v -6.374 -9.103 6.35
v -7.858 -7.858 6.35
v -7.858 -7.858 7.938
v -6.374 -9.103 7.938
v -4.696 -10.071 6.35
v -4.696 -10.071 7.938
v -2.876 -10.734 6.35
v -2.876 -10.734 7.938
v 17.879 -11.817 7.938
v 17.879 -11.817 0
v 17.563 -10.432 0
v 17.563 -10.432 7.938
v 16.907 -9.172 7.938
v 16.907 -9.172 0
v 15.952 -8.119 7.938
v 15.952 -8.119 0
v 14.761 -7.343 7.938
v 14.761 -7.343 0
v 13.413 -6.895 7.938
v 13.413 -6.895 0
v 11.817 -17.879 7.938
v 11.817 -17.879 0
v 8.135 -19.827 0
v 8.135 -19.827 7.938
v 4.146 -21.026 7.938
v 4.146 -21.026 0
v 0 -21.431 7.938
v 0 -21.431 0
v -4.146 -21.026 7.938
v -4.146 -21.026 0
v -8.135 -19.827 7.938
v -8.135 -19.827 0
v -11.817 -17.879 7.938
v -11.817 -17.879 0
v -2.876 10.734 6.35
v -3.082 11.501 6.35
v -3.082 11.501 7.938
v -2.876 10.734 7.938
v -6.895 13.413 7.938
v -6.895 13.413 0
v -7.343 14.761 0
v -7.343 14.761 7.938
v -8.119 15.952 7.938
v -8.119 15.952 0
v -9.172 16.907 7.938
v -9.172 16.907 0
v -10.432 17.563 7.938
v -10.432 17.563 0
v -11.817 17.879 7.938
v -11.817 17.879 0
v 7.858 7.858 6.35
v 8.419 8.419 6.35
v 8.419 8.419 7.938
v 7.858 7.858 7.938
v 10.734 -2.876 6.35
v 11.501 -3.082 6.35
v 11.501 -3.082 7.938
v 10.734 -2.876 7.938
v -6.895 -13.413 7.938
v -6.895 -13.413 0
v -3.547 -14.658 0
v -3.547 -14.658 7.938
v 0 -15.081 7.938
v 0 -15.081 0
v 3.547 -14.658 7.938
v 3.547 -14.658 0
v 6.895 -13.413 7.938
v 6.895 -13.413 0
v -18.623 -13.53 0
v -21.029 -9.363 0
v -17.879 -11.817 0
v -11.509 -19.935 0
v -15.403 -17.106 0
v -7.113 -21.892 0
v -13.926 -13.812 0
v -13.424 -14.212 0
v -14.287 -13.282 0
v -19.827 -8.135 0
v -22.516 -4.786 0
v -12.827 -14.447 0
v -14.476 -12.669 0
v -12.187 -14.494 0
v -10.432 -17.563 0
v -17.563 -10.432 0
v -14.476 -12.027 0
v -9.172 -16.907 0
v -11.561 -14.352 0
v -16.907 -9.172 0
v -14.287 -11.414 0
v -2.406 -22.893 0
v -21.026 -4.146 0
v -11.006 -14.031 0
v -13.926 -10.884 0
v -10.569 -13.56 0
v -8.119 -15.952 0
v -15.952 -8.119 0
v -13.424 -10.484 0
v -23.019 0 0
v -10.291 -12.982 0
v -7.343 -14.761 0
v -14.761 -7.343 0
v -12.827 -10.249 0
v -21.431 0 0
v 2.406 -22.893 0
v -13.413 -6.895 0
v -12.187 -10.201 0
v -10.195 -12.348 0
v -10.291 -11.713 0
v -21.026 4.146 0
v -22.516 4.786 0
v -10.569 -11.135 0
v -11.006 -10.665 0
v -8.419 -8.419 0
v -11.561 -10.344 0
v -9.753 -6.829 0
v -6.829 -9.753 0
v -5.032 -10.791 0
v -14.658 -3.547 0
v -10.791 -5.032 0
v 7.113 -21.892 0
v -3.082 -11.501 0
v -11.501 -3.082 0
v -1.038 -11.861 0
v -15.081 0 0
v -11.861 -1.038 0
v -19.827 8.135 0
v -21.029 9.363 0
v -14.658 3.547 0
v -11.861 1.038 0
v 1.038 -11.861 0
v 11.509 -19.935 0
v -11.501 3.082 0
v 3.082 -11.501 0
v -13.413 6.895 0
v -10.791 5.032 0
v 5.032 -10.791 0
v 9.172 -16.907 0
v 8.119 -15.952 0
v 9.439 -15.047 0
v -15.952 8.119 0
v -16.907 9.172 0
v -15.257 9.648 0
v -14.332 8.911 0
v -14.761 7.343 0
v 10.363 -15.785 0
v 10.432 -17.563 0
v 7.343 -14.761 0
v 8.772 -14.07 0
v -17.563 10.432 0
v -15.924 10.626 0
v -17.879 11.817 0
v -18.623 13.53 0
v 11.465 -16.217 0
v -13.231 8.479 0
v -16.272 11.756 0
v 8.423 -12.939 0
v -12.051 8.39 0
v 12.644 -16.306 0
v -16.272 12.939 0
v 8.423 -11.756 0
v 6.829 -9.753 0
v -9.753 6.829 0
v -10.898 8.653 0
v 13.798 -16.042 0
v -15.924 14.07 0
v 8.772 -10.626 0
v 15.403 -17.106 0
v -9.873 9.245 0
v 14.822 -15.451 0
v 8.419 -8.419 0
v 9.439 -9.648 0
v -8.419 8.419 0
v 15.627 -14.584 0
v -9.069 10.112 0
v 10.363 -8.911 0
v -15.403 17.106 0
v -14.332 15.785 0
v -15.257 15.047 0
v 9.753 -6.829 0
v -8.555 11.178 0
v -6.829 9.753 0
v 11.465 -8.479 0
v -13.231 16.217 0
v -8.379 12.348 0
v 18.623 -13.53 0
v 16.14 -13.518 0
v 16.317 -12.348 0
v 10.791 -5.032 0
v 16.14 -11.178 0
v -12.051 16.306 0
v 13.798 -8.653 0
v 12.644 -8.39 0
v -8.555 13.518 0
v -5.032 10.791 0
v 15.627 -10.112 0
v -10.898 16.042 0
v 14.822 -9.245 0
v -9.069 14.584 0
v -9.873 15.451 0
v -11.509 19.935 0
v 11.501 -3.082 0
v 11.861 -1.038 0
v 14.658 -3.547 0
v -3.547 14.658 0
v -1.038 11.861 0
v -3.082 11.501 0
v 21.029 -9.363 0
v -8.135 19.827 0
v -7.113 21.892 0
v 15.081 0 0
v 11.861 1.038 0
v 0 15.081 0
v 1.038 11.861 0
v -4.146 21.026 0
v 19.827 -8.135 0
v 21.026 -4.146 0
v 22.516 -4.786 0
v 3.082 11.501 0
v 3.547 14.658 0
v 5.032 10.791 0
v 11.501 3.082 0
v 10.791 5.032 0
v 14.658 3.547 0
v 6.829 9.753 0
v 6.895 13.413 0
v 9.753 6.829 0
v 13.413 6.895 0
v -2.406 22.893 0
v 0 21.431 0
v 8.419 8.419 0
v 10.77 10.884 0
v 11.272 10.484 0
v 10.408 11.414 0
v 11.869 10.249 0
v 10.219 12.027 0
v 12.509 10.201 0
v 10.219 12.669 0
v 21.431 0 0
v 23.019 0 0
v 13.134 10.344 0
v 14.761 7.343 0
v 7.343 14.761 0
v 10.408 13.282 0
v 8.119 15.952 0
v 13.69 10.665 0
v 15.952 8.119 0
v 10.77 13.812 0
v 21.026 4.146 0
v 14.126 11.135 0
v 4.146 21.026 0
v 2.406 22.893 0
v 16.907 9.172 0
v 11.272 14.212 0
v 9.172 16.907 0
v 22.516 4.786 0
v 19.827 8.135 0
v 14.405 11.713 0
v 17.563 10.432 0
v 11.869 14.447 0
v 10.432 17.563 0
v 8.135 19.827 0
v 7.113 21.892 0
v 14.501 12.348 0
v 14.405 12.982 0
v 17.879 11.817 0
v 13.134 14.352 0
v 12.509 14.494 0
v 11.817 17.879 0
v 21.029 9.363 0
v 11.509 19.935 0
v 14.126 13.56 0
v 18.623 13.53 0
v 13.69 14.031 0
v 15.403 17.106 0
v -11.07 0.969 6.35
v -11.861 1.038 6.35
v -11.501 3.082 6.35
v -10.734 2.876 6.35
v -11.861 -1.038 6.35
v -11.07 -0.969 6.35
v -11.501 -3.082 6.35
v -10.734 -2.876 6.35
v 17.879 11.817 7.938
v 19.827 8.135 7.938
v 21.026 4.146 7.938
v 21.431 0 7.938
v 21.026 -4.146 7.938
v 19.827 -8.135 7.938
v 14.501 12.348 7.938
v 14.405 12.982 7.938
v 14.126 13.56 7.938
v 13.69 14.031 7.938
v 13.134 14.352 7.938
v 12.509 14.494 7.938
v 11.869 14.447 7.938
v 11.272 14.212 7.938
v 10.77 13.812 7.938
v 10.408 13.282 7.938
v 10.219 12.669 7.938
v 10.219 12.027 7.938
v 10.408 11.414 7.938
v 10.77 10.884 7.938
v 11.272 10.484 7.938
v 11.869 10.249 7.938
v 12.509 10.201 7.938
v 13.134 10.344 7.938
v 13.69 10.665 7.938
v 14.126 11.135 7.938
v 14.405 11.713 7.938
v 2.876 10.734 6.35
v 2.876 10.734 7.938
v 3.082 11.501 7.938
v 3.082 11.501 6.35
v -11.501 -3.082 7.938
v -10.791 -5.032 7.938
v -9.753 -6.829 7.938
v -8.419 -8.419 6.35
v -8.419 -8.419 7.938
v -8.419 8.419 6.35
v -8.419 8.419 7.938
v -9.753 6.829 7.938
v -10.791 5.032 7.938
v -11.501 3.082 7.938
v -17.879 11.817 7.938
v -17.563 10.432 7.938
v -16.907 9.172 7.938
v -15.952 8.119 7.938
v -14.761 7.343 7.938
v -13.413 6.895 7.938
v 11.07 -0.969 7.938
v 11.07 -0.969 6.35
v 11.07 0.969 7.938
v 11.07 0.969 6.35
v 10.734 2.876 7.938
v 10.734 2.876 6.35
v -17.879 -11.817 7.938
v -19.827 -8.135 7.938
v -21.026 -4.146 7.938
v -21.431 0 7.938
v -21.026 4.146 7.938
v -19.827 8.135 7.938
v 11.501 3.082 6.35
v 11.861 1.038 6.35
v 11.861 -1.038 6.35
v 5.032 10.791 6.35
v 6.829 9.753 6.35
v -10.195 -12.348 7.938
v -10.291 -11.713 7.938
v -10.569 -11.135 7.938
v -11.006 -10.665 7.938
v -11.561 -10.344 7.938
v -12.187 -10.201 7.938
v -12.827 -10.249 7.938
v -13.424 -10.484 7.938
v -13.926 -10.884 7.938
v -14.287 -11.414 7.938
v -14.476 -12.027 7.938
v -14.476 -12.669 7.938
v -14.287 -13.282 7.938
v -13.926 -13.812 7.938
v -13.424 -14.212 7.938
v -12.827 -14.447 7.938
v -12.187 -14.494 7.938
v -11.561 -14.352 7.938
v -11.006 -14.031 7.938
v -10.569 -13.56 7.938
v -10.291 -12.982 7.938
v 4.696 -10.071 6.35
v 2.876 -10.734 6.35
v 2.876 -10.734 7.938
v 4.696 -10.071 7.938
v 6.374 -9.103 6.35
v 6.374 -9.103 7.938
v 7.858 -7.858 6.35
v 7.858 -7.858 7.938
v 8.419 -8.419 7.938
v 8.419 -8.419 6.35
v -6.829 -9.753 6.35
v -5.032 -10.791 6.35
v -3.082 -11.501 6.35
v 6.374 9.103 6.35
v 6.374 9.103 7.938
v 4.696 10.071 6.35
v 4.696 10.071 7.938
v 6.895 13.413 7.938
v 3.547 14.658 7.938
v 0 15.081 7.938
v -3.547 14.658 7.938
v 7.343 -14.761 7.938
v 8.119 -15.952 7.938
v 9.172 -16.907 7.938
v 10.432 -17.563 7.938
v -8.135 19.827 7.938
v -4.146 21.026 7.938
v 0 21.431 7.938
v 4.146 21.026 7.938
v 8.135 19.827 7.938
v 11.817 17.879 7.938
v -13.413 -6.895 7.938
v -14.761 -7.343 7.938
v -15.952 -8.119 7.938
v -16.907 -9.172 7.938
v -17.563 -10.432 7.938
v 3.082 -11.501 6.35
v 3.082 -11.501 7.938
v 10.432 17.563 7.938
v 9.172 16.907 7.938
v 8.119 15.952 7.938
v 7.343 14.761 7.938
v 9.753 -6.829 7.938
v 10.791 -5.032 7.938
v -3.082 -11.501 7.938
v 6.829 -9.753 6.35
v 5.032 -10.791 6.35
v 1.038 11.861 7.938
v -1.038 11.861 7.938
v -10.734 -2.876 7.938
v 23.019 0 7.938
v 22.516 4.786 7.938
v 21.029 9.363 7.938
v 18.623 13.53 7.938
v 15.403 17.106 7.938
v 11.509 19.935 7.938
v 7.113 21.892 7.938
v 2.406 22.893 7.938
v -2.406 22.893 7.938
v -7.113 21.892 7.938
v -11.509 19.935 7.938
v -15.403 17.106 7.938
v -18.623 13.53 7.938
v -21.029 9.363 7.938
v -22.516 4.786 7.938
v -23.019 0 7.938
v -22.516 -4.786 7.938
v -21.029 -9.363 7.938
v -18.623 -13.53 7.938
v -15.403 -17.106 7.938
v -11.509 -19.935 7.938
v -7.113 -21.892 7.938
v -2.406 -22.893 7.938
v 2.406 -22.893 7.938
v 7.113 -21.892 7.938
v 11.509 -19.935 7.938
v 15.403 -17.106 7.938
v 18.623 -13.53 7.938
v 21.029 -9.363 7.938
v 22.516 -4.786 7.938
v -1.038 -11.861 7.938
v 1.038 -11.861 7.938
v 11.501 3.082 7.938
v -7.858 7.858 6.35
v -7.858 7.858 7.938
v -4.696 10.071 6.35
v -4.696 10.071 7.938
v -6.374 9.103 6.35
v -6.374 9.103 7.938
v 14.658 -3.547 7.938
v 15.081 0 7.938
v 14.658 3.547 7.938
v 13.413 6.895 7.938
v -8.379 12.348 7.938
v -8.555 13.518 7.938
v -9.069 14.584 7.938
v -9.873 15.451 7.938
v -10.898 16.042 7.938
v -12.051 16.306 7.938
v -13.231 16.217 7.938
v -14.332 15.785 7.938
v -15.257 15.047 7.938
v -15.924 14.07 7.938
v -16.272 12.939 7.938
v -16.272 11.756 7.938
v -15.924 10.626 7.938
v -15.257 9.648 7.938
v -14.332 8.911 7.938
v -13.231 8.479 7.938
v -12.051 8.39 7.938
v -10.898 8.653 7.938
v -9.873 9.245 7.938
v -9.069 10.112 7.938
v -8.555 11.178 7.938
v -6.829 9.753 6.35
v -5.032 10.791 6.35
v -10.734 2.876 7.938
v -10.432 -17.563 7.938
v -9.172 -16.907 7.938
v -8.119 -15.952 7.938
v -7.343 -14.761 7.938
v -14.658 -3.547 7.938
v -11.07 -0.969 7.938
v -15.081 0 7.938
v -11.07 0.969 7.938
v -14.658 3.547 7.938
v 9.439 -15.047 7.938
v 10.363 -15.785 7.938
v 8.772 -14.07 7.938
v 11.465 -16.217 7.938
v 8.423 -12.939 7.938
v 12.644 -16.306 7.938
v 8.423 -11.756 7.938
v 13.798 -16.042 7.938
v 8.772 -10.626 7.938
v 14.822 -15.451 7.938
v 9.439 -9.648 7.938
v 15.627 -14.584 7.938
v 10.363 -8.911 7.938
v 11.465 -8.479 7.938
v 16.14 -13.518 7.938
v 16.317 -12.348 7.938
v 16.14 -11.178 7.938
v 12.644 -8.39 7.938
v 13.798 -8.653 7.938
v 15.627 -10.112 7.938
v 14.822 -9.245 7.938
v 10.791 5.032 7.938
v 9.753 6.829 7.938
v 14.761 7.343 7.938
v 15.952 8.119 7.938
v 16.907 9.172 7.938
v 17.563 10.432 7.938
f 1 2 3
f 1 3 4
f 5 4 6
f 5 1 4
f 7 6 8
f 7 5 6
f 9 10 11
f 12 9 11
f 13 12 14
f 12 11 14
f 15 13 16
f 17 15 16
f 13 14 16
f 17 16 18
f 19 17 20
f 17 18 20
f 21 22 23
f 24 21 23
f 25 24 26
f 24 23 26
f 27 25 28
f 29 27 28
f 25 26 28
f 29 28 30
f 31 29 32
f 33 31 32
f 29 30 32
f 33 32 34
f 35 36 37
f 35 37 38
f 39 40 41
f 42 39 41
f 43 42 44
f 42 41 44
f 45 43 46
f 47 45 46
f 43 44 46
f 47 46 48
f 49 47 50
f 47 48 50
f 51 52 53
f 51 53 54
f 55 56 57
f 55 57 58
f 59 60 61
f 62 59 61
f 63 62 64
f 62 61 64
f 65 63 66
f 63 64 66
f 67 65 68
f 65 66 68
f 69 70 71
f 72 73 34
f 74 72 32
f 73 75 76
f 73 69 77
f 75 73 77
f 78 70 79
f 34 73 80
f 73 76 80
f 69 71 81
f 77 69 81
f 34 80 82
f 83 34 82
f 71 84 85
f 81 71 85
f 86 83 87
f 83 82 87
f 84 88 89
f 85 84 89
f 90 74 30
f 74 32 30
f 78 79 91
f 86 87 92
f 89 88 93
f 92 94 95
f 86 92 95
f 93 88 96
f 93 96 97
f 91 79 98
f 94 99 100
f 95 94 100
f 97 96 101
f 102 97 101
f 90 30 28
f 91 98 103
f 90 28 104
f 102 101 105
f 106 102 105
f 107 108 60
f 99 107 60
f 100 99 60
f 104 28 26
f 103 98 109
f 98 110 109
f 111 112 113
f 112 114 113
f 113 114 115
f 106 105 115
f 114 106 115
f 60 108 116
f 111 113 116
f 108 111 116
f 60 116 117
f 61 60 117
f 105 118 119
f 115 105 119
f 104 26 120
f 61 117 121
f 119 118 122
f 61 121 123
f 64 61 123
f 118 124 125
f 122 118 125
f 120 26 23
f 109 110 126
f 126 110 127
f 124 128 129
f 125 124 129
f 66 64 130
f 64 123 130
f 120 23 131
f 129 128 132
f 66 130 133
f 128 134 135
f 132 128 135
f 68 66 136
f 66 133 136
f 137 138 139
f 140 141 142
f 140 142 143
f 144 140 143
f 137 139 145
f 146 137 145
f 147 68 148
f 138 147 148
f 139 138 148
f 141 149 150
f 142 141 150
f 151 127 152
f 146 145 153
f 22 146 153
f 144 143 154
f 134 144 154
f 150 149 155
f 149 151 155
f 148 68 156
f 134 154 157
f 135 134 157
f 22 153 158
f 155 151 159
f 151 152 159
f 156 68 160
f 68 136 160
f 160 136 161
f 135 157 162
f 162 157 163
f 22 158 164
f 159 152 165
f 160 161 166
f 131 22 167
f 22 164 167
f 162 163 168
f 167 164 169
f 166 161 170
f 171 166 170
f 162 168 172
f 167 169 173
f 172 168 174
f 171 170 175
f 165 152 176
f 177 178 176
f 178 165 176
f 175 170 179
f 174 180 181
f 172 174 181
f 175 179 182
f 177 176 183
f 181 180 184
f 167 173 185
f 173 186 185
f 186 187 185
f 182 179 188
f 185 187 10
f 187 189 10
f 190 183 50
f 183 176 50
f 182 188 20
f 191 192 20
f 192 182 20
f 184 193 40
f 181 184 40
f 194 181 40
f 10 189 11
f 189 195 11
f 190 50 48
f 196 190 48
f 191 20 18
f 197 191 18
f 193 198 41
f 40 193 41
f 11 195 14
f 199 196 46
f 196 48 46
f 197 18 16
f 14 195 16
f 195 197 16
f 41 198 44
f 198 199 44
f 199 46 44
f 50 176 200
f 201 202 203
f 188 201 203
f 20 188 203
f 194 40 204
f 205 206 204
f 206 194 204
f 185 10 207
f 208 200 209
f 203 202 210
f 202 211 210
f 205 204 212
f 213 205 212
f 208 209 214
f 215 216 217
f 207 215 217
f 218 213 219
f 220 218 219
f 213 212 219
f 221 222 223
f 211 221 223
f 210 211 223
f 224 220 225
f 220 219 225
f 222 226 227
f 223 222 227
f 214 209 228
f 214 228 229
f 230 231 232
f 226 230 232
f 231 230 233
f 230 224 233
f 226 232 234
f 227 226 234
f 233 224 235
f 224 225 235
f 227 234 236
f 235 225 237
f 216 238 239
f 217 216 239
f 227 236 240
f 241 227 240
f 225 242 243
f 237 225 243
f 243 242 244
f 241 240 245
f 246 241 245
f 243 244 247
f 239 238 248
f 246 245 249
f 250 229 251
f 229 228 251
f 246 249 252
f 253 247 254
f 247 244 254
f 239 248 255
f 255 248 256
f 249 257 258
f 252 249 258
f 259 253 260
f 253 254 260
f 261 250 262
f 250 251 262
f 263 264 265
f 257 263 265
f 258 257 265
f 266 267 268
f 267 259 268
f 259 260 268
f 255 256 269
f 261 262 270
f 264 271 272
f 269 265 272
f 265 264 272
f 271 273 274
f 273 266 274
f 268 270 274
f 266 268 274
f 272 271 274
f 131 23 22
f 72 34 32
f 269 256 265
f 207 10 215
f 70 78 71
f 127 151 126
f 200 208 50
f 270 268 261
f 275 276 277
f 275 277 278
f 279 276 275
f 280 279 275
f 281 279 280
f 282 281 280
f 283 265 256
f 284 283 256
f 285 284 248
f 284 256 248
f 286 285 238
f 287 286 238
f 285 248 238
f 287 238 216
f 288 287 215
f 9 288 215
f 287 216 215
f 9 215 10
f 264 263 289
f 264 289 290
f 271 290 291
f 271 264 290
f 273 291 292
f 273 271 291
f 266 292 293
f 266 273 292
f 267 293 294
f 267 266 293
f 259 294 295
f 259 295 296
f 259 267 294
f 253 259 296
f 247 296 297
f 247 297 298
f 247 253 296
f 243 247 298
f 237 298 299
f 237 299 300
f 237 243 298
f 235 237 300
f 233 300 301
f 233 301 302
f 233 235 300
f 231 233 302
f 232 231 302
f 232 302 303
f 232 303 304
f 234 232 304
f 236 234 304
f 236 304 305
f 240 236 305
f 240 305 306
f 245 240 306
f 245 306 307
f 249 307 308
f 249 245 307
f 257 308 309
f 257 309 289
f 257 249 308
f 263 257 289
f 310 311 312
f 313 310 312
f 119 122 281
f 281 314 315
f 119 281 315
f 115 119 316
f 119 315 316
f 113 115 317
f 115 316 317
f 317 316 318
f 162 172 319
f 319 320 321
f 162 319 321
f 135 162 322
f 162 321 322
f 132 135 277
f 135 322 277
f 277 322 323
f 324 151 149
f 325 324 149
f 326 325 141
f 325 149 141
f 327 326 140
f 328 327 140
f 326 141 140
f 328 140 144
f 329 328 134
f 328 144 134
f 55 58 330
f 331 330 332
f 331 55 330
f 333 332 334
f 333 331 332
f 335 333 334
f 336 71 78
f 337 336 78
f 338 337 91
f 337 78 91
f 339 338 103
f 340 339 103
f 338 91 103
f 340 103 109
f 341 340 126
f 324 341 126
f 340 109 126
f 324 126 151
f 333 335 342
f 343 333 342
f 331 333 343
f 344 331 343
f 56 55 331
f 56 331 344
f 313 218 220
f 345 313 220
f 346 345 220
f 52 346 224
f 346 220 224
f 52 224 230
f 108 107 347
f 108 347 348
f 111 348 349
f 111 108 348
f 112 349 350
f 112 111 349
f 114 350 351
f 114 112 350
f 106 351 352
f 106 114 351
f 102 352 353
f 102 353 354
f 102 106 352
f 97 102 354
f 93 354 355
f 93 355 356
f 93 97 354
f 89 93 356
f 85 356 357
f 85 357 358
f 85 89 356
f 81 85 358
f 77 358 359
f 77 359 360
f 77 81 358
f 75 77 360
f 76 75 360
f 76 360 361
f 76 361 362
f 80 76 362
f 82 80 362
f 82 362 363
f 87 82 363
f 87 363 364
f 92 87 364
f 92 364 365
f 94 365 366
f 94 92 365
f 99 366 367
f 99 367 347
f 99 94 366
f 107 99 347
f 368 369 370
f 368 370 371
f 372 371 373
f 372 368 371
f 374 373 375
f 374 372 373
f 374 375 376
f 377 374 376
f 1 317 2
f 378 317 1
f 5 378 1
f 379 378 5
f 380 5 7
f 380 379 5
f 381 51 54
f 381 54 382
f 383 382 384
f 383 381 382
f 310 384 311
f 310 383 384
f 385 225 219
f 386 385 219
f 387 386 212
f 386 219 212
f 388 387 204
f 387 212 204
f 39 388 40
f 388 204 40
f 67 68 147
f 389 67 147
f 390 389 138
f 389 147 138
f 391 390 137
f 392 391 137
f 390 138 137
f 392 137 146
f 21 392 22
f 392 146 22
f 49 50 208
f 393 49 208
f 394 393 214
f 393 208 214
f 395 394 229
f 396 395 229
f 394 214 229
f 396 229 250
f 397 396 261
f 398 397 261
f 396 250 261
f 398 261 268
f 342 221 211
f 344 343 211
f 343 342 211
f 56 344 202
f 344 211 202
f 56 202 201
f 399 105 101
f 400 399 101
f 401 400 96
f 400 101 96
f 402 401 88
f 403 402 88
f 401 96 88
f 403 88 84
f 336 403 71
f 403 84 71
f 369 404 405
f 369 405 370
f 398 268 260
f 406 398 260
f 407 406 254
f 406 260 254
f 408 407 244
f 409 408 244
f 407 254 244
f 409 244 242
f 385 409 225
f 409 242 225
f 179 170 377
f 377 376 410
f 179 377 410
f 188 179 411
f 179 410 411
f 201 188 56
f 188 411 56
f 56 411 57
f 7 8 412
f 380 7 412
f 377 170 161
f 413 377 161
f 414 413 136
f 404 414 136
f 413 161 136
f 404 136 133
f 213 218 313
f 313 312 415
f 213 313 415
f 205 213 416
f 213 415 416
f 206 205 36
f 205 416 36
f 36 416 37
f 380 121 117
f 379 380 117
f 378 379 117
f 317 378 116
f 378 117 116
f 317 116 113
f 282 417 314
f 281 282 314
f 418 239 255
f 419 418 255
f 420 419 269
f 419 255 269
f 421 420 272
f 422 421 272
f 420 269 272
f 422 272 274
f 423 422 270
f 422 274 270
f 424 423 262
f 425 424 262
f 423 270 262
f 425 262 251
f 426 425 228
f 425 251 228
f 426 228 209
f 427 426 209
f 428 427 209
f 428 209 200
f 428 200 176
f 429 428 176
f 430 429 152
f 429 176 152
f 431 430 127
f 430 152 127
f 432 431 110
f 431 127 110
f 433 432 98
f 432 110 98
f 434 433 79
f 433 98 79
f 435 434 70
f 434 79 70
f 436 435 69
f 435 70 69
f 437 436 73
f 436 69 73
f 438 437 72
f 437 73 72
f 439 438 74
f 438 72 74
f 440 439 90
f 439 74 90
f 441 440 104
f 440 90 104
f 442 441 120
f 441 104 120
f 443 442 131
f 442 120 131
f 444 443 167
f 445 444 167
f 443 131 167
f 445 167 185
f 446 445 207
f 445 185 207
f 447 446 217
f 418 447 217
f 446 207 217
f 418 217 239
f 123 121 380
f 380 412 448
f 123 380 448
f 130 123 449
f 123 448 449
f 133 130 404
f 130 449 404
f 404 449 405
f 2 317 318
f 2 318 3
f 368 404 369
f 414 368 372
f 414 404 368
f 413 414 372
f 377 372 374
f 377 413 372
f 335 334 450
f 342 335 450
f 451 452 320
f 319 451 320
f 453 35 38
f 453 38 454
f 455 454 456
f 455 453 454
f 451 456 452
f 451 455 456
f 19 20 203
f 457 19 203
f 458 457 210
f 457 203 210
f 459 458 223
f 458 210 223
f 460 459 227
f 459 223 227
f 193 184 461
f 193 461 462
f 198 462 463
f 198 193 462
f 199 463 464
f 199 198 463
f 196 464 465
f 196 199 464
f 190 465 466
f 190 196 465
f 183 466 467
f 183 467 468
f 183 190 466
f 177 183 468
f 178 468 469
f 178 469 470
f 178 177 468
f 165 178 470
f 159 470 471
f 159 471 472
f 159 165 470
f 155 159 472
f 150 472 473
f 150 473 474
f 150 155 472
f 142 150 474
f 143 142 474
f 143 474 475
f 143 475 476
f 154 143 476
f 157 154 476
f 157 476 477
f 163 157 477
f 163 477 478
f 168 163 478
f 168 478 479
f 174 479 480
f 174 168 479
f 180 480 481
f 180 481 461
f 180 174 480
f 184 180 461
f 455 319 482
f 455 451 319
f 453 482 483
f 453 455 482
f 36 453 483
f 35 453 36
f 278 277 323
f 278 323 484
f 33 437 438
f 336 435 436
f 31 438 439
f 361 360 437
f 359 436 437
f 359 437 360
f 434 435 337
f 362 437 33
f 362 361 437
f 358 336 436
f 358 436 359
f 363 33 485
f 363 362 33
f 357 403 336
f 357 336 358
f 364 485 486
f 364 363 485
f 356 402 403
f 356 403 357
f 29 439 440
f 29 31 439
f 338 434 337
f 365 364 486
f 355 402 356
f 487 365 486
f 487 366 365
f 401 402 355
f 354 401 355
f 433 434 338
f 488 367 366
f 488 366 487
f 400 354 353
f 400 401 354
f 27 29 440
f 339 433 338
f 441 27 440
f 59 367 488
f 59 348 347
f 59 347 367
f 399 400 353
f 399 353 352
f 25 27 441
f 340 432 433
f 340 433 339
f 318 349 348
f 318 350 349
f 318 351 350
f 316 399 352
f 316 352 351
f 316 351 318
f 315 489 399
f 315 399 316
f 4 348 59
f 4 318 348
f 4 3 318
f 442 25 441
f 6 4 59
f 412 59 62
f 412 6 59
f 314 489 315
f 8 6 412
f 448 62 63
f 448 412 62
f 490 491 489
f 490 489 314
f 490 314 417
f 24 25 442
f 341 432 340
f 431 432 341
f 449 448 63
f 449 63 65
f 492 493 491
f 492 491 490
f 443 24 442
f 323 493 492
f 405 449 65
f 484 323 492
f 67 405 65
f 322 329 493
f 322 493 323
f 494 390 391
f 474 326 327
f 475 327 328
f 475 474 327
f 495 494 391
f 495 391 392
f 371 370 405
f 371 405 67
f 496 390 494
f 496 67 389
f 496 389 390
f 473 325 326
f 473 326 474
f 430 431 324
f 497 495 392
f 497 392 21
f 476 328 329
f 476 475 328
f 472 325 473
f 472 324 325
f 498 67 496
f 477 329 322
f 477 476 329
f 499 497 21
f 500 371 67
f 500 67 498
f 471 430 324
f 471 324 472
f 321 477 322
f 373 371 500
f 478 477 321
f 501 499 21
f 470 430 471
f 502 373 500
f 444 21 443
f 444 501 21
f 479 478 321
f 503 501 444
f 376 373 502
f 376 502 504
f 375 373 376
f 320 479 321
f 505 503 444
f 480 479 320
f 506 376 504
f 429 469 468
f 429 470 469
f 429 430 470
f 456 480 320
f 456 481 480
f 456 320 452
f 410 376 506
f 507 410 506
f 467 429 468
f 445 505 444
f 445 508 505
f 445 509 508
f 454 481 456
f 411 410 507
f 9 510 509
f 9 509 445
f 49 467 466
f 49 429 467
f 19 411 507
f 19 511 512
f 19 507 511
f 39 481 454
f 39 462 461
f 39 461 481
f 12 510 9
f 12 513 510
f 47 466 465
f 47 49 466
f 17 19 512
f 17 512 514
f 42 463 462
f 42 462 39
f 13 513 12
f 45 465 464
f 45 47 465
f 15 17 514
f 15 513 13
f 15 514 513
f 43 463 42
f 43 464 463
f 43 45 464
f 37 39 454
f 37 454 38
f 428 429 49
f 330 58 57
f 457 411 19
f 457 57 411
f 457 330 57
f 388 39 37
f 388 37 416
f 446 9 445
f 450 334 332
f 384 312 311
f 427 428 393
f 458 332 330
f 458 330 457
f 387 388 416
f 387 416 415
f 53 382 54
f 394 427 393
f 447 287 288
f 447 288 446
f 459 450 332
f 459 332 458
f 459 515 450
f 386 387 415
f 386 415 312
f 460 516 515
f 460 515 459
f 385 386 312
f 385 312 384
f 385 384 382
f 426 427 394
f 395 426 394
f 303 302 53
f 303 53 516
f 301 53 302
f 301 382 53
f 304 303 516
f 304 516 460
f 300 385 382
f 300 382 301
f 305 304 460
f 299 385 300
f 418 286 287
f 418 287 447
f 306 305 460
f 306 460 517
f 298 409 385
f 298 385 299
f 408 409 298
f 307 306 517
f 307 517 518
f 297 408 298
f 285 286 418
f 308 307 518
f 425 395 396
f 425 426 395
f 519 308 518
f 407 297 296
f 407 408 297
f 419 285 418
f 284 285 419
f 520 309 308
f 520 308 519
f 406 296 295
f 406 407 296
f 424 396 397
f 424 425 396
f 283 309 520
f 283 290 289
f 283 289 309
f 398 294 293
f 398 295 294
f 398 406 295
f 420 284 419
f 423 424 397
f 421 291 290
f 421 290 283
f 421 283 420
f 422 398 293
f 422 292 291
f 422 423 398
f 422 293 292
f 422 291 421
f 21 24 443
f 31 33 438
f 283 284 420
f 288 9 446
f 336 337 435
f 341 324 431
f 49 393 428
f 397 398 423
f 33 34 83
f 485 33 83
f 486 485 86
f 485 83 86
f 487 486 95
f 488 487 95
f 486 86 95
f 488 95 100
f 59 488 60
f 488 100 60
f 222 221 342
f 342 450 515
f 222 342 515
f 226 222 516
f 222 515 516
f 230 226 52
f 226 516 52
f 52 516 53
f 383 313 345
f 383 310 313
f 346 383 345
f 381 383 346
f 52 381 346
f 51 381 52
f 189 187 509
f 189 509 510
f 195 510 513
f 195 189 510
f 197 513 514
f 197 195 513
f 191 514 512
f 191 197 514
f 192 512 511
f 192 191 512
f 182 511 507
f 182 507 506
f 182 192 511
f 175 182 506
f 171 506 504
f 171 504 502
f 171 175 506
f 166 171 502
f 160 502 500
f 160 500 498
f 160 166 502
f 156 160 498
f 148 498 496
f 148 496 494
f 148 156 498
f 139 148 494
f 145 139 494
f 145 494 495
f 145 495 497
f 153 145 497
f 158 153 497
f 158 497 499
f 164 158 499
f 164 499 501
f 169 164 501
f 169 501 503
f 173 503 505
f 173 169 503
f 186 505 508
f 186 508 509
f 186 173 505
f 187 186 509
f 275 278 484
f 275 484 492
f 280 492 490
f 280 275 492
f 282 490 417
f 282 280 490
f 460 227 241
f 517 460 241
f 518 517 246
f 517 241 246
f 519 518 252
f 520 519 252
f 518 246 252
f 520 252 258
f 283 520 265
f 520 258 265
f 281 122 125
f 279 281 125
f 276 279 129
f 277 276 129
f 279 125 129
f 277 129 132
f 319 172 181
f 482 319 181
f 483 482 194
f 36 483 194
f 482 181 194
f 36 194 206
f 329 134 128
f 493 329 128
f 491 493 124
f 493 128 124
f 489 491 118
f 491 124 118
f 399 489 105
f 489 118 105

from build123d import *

# Parameters (mm, degrees)
F0_R            = 23.01875
F0_R_2          = 2.15265
F0_R_3          = 3.96875
F0_R_4          = 11.1125
F1_DEPTH        = 7.9375
F3_DEPTH        = 7.9375
F4_COUNT        = 6
F4_ANGLE        = 300
F6_R            = 11.90625
F7_DEPTH        = 6.35
F9_DEPTH        = 7.9375
F9_COPIES_COUNT = 4


# Not quite as in the source:
# - a pattern or mirror of a feature is missing from the dataset's text; its kind, count and spacing are read off the source's solid


with BuildPart() as f1:
    # F0 (on Top) → F1 (new body)
    with BuildSketch(Plane.XY):
        Circle(F0_R)
        with Locations((-12.3478521665, -12.3478521665)):
            Circle(F0_R_2, mode=Mode.SUBTRACT)
        with Locations((12.3478521665, -12.3478521665)):
            Circle(F0_R_3, mode=Mode.SUBTRACT)
        with Locations((-12.3478521665, 12.3478521665)):
            Circle(F0_R_3, mode=Mode.SUBTRACT)
        Circle(F0_R_4, mode=Mode.SUBTRACT)
        with Locations((12.3478521665, 12.3478521665)):
            Circle(F0_R_2, mode=Mode.SUBTRACT)
    extrude(amount=F1_DEPTH)

    # F2 (on face) → F3 (cut, through all)
    with BuildSketch(Plane.XY.offset(7.9375)):
        with BuildLine():
            Line((-3.0815642558, 11.5005543693), (-2.8761266387, 10.7338507446))
            ThreePointArc((-2.8761266387, 10.7338507446), (0, 11.1125), (2.8761266387, 10.7338507446))
            Line((2.8761266387, 10.7338507446), (3.0815642558, 11.5005543693))
            ThreePointArc((3.0815642558, 11.5005543693), (0, 11.90625), (-3.0815642558, 11.5005543693))
        make_face()
    f3 = extrude(amount=-F3_DEPTH, mode=Mode.SUBTRACT)

    # F4: F3 ×6 about axis
    f4_axis = Axis((0, 0, 0), (0, 0, -1))
    for i in range(1, F4_COUNT):
        add(f3.rotate(f4_axis, i * F4_ANGLE / (F4_COUNT - 1)), mode=Mode.SUBTRACT)

    # F6 (on face) → F7 (cut, through all)
    with BuildSketch(Plane(origin=(0, 0, 0), x_dir=(1, 0, 0), z_dir=(0, 0, -1))):
        Circle(F6_R)
    extrude(amount=-F7_DEPTH, mode=Mode.SUBTRACT)

    # F8 (on face) → F9 (cut, through all)
    with BuildSketch(Plane(origin=(0, 0, 0), x_dir=(1, 0, 0), z_dir=(0, 0, -1))):
        with BuildLine():
            ThreePointArc((-13.4129757356, 6.8946489019), (-16.4630716815, 8.614638751), (-17.8787189274, 11.8173552911))
            ThreePointArc((-17.8787189274, 11.8173552911), (-21.43125, 0), (-17.8787189274, -11.8173552911))
            ThreePointArc((-17.8787189274, -11.8173552911), (-16.4630716815, -8.614638751), (-13.4129757356, -6.8946489019))
            ThreePointArc((-13.4129757356, -6.8946489019), (-15.08125, 0), (-13.4129757356, 6.8946489019))
        make_face()
    f9 = extrude(amount=-F9_DEPTH, mode=Mode.SUBTRACT)

    # F9_copies: F9 ×4 about axis
    f9_copies_axis = Axis((0, 0, 0), (0, 0, 1))
    for i in range(1, F9_COPIES_COUNT):
        add(f9.rotate(f9_copies_axis, i * 360 / F9_COPIES_COUNT), mode=Mode.SUBTRACT)


solid = f1.part
